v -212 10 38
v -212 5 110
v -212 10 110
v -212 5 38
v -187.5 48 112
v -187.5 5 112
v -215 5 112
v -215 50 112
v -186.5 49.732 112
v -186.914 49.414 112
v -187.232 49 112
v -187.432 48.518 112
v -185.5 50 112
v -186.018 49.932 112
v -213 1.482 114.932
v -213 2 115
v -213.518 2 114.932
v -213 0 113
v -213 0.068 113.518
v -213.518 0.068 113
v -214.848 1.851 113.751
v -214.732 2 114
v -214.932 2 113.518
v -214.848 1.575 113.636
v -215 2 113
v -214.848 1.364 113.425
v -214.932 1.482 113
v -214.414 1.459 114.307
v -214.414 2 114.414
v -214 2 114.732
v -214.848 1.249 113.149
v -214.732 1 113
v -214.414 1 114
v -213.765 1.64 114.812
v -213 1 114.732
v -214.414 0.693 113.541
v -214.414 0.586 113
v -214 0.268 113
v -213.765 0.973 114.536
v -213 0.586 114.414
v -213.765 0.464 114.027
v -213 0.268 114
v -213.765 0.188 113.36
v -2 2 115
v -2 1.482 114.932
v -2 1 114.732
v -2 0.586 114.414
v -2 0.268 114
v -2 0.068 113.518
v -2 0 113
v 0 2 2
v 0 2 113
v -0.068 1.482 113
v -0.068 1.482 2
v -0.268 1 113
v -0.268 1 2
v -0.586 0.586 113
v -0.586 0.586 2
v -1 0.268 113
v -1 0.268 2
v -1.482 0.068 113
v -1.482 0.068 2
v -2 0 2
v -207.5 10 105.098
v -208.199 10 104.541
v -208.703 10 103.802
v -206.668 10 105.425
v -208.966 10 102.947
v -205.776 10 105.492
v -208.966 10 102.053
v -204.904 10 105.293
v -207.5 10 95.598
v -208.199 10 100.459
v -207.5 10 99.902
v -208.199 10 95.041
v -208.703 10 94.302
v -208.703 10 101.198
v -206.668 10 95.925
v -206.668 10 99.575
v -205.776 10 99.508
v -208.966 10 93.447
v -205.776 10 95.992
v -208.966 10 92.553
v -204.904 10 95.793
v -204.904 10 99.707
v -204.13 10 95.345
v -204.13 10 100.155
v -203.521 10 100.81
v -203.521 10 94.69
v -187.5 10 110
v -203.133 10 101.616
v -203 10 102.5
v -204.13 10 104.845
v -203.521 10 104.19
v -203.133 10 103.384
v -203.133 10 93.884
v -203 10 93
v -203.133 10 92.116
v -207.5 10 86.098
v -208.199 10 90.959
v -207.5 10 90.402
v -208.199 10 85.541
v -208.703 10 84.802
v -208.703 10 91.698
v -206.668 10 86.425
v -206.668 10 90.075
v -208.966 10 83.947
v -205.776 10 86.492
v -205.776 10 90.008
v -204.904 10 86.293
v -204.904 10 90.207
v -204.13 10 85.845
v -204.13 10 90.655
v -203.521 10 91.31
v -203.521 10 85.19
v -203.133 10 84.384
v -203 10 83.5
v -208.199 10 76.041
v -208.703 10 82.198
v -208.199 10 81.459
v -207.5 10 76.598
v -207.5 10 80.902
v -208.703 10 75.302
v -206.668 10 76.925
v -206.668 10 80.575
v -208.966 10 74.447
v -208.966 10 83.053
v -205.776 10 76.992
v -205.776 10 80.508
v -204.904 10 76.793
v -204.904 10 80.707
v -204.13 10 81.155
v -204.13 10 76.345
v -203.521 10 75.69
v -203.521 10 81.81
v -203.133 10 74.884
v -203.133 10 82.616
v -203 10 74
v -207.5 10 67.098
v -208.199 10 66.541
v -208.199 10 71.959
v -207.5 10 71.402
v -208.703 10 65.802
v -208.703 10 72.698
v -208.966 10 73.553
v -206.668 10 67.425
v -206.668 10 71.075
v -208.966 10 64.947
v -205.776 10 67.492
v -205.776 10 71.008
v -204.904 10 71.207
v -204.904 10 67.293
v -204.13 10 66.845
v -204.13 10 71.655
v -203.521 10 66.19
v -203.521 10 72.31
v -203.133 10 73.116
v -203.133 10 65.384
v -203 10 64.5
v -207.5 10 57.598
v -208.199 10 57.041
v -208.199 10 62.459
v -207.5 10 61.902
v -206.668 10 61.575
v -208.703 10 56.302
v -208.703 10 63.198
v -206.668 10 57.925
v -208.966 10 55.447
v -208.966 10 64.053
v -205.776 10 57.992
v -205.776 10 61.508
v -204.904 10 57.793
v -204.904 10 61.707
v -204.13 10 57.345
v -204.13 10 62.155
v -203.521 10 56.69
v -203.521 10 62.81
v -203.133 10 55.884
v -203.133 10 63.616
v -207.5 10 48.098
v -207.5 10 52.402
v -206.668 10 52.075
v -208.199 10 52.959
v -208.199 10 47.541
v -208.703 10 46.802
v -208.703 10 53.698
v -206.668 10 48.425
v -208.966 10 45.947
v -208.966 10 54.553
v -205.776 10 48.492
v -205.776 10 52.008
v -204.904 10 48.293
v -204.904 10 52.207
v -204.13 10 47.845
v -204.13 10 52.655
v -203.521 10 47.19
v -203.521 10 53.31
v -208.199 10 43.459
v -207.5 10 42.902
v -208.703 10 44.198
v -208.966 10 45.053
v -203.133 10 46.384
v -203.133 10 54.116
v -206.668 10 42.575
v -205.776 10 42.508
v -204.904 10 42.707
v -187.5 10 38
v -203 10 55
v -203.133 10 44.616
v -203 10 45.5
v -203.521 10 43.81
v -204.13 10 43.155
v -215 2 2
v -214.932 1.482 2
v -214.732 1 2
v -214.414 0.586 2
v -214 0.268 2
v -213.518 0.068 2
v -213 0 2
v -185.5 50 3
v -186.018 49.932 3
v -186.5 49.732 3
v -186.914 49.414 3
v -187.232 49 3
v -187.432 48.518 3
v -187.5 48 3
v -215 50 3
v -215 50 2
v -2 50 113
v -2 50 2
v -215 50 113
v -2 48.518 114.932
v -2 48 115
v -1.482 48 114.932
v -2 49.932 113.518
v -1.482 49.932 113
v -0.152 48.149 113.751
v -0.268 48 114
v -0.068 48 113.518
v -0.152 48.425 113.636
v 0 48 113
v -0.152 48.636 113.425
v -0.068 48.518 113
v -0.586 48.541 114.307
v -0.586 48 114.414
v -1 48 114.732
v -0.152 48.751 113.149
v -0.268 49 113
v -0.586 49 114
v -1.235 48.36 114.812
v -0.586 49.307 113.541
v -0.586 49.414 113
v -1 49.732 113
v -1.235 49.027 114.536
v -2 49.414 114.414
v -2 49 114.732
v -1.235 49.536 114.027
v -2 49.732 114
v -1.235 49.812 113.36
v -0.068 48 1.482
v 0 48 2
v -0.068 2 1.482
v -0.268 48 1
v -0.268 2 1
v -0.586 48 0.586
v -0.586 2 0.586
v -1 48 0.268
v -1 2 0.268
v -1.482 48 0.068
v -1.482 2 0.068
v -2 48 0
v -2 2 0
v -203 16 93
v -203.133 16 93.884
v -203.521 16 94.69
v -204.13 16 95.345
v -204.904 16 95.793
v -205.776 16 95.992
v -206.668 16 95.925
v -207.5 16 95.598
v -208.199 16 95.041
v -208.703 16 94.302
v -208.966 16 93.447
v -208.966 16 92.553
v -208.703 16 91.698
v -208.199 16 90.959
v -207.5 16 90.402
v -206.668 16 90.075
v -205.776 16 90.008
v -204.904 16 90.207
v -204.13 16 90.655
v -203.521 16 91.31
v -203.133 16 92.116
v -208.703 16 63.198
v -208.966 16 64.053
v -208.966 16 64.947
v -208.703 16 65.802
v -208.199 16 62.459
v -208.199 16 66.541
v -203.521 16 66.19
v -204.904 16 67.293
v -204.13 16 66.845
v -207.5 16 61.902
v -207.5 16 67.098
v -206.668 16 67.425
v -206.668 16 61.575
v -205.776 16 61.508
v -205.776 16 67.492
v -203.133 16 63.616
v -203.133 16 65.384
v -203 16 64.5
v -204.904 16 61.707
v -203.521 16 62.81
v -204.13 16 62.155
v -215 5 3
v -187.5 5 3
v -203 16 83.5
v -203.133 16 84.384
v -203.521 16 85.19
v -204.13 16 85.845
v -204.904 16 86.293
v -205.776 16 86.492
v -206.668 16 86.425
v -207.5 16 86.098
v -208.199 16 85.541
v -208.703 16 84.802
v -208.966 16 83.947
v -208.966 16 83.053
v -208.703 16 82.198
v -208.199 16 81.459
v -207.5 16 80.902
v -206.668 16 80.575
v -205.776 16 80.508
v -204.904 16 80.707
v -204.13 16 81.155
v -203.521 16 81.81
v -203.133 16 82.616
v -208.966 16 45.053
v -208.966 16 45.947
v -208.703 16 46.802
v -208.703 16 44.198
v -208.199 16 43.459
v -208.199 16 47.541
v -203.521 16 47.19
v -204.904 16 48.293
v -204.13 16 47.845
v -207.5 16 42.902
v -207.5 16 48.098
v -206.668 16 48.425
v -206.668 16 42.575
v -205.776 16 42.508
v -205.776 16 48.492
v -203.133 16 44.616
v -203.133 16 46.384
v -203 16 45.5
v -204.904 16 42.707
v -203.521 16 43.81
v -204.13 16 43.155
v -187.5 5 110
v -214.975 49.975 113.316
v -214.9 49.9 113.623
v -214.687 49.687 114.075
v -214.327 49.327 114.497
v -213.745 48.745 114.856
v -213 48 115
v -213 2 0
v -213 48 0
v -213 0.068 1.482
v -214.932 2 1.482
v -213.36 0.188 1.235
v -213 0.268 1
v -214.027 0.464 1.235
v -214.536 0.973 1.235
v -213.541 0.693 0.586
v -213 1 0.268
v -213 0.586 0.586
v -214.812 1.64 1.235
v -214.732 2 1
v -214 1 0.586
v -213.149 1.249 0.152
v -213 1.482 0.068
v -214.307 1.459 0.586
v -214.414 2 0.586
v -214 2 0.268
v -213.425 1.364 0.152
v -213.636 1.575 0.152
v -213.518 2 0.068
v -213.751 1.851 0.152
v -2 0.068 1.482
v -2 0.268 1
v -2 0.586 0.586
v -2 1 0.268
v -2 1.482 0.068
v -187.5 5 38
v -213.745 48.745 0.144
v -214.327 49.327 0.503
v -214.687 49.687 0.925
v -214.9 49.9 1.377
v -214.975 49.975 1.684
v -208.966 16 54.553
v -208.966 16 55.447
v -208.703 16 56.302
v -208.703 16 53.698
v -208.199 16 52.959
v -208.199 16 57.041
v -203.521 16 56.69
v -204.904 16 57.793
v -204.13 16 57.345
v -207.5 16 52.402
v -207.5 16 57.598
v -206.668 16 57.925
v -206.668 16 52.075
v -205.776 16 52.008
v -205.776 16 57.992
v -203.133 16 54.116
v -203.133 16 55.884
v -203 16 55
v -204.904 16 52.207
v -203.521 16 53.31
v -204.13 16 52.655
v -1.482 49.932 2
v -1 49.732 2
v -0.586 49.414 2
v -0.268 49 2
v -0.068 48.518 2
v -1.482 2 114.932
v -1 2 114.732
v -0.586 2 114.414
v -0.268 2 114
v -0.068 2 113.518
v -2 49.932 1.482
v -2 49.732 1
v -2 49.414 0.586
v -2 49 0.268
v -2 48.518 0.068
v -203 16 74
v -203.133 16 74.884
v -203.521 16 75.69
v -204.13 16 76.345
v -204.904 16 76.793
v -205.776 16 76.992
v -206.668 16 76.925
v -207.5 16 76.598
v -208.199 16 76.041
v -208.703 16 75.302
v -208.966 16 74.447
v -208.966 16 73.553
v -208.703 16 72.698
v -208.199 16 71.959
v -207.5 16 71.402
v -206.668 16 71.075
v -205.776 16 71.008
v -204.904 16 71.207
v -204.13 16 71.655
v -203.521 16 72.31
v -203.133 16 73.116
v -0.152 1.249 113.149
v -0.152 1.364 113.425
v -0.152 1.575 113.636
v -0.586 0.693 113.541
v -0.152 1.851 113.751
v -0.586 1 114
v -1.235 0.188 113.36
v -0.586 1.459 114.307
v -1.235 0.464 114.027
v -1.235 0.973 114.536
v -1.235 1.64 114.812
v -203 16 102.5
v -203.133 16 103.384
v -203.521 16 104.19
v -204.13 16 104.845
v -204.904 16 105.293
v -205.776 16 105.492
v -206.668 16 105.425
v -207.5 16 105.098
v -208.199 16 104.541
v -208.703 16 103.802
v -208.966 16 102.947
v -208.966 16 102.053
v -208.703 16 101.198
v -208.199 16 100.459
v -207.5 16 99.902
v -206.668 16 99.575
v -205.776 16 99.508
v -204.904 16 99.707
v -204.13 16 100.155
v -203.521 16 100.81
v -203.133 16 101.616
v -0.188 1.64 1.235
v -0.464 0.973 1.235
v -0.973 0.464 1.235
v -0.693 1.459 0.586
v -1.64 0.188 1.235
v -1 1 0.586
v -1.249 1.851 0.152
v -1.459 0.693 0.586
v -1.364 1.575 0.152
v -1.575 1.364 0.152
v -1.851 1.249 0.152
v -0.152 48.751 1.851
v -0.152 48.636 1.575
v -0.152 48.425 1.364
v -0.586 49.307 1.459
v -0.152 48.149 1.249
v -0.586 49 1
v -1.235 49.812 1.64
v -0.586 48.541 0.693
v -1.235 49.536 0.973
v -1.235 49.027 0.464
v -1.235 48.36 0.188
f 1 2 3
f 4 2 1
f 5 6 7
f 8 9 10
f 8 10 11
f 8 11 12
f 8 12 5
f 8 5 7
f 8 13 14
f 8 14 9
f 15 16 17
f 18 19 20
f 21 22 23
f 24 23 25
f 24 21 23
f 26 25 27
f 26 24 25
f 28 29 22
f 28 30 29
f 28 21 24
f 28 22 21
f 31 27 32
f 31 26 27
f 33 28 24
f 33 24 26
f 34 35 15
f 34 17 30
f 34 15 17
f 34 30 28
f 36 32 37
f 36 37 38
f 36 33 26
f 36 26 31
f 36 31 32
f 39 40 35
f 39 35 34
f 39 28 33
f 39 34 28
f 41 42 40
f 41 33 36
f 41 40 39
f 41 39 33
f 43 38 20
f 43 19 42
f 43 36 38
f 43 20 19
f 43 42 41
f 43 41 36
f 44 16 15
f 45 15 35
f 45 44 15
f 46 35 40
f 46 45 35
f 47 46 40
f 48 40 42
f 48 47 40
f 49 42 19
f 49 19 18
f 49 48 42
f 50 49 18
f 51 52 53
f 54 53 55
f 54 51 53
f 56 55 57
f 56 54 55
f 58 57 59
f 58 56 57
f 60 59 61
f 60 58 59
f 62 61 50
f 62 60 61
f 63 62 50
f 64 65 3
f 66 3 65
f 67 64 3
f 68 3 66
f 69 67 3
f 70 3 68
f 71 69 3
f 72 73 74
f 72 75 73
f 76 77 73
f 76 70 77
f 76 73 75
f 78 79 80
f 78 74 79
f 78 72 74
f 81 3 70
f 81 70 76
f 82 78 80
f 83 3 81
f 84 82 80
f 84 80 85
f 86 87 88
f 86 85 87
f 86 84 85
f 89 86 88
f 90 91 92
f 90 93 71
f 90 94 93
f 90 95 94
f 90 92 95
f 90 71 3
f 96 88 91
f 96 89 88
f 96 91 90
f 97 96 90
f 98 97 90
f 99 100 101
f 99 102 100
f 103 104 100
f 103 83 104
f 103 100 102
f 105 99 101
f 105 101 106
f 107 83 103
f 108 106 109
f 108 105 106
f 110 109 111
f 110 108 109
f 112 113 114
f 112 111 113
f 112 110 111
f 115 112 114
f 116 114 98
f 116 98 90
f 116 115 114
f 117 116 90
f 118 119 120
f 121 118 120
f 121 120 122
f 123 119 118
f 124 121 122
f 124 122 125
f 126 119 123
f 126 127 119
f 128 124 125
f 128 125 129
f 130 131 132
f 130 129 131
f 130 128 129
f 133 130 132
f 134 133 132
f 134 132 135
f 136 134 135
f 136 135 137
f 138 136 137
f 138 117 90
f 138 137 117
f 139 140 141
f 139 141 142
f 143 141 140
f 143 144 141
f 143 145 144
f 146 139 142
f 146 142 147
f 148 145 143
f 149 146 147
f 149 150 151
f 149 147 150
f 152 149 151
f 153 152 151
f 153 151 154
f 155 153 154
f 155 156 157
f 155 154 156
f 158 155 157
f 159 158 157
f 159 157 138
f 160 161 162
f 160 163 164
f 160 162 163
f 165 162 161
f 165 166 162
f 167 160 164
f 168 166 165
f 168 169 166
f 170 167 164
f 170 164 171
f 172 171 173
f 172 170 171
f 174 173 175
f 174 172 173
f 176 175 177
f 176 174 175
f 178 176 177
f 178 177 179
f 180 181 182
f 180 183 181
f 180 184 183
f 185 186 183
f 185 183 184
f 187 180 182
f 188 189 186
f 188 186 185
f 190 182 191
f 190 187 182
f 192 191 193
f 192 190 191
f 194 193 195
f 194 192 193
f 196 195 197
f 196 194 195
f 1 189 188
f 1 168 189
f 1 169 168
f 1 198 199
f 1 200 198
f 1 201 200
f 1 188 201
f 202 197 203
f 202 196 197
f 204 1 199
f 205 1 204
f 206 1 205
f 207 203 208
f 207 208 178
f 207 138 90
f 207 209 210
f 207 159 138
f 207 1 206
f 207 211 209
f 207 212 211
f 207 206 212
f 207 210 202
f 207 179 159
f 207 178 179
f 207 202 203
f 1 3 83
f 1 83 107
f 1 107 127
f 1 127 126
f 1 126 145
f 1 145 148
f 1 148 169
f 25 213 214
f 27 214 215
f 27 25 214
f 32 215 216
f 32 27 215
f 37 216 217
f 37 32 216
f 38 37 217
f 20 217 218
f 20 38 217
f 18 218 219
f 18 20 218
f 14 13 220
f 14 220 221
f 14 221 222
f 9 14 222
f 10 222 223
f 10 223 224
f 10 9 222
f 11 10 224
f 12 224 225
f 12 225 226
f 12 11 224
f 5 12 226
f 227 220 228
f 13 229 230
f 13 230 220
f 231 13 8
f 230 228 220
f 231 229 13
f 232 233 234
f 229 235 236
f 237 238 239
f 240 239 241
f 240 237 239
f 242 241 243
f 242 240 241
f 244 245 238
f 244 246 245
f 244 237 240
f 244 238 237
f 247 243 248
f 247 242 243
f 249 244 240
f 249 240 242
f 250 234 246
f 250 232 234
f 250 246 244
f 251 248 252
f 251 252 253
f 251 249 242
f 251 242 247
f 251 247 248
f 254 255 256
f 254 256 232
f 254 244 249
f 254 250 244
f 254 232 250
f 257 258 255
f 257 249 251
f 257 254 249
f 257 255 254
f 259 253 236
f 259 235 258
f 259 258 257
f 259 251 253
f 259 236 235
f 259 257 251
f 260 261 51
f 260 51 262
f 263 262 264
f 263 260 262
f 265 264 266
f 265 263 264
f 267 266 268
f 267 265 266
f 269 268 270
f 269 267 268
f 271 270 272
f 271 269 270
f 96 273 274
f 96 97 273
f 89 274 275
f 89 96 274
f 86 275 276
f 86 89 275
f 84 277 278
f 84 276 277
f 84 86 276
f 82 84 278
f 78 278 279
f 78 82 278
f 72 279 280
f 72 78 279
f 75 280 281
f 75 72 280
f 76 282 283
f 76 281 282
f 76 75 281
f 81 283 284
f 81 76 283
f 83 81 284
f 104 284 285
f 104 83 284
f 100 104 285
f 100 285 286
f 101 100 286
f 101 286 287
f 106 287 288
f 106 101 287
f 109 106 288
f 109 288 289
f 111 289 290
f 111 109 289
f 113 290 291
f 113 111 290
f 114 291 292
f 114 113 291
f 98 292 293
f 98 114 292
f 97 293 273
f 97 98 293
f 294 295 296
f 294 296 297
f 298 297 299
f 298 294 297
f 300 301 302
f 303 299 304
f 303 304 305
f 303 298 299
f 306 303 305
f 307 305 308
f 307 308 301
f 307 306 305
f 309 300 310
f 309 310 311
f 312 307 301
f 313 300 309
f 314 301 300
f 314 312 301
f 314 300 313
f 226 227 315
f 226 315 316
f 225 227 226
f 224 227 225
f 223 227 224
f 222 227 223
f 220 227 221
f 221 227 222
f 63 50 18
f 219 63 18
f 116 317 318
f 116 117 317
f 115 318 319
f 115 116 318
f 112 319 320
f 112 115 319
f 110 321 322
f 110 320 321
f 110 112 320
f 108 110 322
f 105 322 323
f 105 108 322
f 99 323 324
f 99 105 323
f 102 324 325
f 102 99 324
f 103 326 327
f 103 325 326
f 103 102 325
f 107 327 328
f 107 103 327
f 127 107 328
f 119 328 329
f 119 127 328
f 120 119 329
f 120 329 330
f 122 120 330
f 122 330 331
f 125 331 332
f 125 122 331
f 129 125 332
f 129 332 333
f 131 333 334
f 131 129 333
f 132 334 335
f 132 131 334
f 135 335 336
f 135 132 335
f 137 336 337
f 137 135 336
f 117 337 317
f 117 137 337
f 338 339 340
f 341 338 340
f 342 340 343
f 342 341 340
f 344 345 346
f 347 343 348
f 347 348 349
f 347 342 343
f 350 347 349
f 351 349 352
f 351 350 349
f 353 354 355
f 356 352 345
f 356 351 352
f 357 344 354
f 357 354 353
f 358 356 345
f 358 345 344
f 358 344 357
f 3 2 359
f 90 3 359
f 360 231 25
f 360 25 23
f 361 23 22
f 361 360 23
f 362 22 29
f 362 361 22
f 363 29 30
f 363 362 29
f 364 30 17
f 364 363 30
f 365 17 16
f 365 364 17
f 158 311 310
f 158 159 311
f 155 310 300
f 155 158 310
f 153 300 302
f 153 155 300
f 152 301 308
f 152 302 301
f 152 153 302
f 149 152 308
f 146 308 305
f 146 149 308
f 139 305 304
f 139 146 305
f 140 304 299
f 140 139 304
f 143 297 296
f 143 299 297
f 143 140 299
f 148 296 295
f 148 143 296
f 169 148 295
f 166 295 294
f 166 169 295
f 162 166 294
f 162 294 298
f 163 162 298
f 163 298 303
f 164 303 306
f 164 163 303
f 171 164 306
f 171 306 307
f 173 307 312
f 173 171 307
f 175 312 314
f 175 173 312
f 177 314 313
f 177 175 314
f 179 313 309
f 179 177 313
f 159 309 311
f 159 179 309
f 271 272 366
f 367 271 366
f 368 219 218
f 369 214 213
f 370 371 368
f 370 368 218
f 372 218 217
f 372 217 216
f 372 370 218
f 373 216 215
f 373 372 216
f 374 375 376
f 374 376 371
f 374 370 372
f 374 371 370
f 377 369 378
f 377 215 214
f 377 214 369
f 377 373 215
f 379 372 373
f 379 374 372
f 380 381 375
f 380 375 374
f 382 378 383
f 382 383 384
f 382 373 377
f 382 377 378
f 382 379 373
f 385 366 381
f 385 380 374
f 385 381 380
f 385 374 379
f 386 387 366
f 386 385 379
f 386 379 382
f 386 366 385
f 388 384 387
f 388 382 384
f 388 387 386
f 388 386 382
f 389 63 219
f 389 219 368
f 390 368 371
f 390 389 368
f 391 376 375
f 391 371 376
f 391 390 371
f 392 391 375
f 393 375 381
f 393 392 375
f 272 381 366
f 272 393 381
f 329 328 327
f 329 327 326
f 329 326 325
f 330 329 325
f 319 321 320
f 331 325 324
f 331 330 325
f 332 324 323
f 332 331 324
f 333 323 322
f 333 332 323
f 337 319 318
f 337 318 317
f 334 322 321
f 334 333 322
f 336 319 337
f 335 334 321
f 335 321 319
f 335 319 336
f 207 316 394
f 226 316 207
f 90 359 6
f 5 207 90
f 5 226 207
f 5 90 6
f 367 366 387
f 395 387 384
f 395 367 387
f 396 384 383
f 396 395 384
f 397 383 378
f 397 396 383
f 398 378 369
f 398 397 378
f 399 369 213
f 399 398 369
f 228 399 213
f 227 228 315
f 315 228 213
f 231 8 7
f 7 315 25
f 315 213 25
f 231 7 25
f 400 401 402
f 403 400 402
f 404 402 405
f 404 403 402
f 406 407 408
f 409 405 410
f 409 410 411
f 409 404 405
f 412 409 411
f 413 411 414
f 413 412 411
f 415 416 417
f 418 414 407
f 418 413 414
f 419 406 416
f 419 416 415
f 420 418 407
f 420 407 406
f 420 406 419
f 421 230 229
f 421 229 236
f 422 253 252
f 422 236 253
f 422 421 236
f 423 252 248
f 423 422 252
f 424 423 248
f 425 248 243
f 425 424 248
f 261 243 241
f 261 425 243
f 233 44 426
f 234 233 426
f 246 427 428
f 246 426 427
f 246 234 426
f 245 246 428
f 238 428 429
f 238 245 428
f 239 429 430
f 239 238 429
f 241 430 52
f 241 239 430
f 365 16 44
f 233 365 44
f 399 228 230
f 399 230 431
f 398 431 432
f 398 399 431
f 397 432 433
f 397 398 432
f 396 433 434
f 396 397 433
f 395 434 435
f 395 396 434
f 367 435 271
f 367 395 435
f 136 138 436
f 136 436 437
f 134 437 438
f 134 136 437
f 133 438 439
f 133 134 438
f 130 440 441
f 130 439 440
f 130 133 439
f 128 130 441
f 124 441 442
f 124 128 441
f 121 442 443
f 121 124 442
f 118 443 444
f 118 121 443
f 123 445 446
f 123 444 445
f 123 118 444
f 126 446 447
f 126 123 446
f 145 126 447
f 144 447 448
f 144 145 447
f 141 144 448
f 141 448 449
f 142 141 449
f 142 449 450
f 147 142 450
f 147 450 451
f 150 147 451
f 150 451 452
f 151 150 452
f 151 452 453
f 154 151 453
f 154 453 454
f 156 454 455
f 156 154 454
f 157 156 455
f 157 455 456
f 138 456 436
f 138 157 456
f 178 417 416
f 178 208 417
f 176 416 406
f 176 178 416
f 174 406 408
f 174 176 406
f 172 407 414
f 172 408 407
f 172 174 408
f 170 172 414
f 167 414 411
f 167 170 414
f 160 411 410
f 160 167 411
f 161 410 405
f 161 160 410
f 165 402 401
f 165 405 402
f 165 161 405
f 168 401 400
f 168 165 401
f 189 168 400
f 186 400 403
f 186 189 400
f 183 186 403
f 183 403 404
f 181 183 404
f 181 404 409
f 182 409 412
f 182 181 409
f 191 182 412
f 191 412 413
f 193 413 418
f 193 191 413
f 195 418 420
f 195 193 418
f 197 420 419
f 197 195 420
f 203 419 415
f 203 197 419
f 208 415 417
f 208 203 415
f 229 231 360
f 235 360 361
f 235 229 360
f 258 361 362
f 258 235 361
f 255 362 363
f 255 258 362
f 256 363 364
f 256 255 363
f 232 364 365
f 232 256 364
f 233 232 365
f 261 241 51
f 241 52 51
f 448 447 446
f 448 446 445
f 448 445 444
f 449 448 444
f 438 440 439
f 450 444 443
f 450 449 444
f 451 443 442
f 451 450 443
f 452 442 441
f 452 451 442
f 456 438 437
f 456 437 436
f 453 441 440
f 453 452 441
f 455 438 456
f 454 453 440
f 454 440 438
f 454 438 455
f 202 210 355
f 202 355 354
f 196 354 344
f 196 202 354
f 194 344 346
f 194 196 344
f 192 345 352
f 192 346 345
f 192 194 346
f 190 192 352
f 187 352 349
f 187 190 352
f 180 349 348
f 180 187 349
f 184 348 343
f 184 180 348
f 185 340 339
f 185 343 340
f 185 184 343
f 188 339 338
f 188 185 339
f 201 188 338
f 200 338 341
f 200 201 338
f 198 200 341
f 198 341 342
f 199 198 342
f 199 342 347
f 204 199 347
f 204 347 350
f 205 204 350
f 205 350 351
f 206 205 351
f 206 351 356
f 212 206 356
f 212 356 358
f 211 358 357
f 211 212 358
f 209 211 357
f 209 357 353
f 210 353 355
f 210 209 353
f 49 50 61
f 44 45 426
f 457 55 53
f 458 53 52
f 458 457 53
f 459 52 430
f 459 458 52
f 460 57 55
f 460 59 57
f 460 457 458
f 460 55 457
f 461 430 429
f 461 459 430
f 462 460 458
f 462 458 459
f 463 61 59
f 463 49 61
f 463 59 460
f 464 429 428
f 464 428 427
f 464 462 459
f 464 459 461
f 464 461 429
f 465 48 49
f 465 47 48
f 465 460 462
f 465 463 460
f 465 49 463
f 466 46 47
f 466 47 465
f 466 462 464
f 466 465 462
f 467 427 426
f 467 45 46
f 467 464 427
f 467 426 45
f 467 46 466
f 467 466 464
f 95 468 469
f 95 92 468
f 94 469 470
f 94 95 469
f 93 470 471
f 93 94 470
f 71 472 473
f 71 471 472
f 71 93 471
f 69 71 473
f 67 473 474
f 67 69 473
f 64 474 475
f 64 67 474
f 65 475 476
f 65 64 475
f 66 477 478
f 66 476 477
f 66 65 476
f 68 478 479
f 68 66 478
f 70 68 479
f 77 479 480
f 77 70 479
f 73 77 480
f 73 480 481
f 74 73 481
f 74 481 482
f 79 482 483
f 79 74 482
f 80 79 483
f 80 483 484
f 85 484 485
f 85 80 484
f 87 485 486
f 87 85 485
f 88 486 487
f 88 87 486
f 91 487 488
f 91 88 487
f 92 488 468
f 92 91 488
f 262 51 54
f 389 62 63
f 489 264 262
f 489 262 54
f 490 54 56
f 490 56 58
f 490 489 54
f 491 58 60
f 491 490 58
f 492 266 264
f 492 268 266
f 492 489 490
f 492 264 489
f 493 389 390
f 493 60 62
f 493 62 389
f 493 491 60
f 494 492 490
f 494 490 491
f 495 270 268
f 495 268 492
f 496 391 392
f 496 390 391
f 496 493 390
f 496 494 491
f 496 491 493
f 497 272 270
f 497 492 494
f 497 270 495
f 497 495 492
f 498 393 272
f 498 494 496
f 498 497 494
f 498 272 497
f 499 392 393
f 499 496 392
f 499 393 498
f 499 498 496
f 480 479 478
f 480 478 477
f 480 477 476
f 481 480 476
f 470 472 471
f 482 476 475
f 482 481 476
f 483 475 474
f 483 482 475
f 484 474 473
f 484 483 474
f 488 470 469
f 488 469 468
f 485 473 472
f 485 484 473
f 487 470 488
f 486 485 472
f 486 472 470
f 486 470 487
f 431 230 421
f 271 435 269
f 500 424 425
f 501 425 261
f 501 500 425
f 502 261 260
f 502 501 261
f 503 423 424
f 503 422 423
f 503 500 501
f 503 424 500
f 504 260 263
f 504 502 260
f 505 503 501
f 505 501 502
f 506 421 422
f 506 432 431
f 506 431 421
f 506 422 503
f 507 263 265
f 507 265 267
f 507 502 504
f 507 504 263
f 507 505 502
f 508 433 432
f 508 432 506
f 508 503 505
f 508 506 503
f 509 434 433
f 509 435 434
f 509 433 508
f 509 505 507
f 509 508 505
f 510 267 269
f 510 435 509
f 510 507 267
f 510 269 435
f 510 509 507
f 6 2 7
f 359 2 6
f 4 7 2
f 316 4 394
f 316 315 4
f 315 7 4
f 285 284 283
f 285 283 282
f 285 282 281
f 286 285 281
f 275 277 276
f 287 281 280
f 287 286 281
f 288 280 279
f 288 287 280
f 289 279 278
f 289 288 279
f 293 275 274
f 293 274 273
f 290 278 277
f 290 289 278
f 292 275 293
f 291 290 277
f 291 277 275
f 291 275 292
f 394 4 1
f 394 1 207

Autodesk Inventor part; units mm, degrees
ref_plane "YZ Plane" through (0, 0, 0) normal (1, 0, 0) x (0, 1, 0)
ref_plane "XZ Plane" through (0, 0, 0) normal (0, 1, 0) x (-1, 0, 0)
ref_plane "XY Plane" through (0, 0, 0) normal (0, 0, 1) x (1, 0, 0)
sketch "Sketch1" plane through (0, 0, 0) normal (0, 1, 0) x (-1, 0, 0)
  line L0 (0, 0) -> (215, 0)
  line L1 (215, 0) -> (215, 115)
  line L2 (215, 115) -> (0, 115)
  line L3 (0, 115) -> (0, 0)
  dimension "d0" = 215
  dimension "d1" = 115
extrude "Extrusion1" add sketch "Sketch1" along normal blind 50
sketch "Sketch2" plane through (0, 50, 0) normal (0, 1, 0) x (1, 0, 0)
  line L0 (0, 0) -> (-215, 0) projected
  line L1 (-215, 0) -> (-215, -115) projected
  line L2 (-215, -115) -> (0, -115) projected
  line L3 (0, -115) -> (0, 0) projected
  line L4 (-215, -3) -> (-187.5, -3)
  line L5 (-187.5, -3) -> (-187.5, -112)
  line L6 (-187.5, -112) -> (-215, -112)
  dimension "d4" = 27.5
  dimension "d5" = 3
  dimension "d6" = 3
extrude "Extrusion2" cut sketch "Sketch2" against normal blind 45 contours L4 L5 L6 L1
fillet "Fillet1" radius 2 10 edges at (-107.5, 50, 115) (-107.5, 0, 115) (-107.5, 50, 0) (0, 50, 57.5) (0, 0, 57.5) (0, 25, 115) (0, 25, 0) (-215, 25, 115) (-215, 0, 57.5) (-215, 25, 0)
fillet "Fillet2" radius 2 1 edges at (-187.5, 50, 57.5)
sketch "Sketch3" plane through (0, 5, 0) normal (0, 1, 0) x (1, 0, 0)
  line L0 (-215, -112) -> (-215, -3) projected
  line L1 (-187.5, -112) -> (-215, -112) projected
  line L2 (-187.5, -3) -> (-187.5, -112) projected
  line L3 (-215, -3) -> (-187.5, -3) projected
  line L4 (-212, -110) -> (-212, -38)
  line L5 (-212, -38) -> (-187.5, -38)
  line L6 (-212, -110) -> (-187.5, -110)
  point P0 (0, 0)
  dimension "d14" = 3
  dimension "d15" = 2
  dimension "d16" = 72
extrude "Extrusion3" add sketch "Sketch3" along normal blind 5 contours L6 L4 L5 L2
sketch "Sketch4" plane through (0, 10, 0) normal (0, 1, 0) x (1, 0, 0)
  line L0 (-212, -110) -> (-187.5, -110) projected
  line L1 (-212, -38) -> (-212, -110) projected
  circle A0 centre (-206, -45.5) radius 3
  circle A1 centre (-206, -55) radius 3
  circle A2 centre (-206, -64.5) radius 3
  circle A3 centre (-206, -74) radius 3
  circle A4 centre (-206, -83.5) radius 3
  circle A5 centre (-206, -93) radius 3
  circle A6 centre (-206, -102.5) radius 3
  point P0 (0, 0)
  dimension "d19" = 6
  dimension "d25" = 9.5
  dimension "d26" = 9.5
  dimension "d27" = 9.5
  dimension "d28" = 9.5
  dimension "d29" = 9.5
  dimension "d30" = 9.5
  dimension "d31" = 7.5
  dimension "d32" = 6
extrude "Extrusion4" add sketch "Sketch4" along normal blind 6
fillet "Fillet3" radius 2 3 edges at (-214.4142, 0.5858, 0.5858) (-0.5858, 0.5858, 0.5858) (-107.5, 0, 0)
properties part number "PSUUltibots"
